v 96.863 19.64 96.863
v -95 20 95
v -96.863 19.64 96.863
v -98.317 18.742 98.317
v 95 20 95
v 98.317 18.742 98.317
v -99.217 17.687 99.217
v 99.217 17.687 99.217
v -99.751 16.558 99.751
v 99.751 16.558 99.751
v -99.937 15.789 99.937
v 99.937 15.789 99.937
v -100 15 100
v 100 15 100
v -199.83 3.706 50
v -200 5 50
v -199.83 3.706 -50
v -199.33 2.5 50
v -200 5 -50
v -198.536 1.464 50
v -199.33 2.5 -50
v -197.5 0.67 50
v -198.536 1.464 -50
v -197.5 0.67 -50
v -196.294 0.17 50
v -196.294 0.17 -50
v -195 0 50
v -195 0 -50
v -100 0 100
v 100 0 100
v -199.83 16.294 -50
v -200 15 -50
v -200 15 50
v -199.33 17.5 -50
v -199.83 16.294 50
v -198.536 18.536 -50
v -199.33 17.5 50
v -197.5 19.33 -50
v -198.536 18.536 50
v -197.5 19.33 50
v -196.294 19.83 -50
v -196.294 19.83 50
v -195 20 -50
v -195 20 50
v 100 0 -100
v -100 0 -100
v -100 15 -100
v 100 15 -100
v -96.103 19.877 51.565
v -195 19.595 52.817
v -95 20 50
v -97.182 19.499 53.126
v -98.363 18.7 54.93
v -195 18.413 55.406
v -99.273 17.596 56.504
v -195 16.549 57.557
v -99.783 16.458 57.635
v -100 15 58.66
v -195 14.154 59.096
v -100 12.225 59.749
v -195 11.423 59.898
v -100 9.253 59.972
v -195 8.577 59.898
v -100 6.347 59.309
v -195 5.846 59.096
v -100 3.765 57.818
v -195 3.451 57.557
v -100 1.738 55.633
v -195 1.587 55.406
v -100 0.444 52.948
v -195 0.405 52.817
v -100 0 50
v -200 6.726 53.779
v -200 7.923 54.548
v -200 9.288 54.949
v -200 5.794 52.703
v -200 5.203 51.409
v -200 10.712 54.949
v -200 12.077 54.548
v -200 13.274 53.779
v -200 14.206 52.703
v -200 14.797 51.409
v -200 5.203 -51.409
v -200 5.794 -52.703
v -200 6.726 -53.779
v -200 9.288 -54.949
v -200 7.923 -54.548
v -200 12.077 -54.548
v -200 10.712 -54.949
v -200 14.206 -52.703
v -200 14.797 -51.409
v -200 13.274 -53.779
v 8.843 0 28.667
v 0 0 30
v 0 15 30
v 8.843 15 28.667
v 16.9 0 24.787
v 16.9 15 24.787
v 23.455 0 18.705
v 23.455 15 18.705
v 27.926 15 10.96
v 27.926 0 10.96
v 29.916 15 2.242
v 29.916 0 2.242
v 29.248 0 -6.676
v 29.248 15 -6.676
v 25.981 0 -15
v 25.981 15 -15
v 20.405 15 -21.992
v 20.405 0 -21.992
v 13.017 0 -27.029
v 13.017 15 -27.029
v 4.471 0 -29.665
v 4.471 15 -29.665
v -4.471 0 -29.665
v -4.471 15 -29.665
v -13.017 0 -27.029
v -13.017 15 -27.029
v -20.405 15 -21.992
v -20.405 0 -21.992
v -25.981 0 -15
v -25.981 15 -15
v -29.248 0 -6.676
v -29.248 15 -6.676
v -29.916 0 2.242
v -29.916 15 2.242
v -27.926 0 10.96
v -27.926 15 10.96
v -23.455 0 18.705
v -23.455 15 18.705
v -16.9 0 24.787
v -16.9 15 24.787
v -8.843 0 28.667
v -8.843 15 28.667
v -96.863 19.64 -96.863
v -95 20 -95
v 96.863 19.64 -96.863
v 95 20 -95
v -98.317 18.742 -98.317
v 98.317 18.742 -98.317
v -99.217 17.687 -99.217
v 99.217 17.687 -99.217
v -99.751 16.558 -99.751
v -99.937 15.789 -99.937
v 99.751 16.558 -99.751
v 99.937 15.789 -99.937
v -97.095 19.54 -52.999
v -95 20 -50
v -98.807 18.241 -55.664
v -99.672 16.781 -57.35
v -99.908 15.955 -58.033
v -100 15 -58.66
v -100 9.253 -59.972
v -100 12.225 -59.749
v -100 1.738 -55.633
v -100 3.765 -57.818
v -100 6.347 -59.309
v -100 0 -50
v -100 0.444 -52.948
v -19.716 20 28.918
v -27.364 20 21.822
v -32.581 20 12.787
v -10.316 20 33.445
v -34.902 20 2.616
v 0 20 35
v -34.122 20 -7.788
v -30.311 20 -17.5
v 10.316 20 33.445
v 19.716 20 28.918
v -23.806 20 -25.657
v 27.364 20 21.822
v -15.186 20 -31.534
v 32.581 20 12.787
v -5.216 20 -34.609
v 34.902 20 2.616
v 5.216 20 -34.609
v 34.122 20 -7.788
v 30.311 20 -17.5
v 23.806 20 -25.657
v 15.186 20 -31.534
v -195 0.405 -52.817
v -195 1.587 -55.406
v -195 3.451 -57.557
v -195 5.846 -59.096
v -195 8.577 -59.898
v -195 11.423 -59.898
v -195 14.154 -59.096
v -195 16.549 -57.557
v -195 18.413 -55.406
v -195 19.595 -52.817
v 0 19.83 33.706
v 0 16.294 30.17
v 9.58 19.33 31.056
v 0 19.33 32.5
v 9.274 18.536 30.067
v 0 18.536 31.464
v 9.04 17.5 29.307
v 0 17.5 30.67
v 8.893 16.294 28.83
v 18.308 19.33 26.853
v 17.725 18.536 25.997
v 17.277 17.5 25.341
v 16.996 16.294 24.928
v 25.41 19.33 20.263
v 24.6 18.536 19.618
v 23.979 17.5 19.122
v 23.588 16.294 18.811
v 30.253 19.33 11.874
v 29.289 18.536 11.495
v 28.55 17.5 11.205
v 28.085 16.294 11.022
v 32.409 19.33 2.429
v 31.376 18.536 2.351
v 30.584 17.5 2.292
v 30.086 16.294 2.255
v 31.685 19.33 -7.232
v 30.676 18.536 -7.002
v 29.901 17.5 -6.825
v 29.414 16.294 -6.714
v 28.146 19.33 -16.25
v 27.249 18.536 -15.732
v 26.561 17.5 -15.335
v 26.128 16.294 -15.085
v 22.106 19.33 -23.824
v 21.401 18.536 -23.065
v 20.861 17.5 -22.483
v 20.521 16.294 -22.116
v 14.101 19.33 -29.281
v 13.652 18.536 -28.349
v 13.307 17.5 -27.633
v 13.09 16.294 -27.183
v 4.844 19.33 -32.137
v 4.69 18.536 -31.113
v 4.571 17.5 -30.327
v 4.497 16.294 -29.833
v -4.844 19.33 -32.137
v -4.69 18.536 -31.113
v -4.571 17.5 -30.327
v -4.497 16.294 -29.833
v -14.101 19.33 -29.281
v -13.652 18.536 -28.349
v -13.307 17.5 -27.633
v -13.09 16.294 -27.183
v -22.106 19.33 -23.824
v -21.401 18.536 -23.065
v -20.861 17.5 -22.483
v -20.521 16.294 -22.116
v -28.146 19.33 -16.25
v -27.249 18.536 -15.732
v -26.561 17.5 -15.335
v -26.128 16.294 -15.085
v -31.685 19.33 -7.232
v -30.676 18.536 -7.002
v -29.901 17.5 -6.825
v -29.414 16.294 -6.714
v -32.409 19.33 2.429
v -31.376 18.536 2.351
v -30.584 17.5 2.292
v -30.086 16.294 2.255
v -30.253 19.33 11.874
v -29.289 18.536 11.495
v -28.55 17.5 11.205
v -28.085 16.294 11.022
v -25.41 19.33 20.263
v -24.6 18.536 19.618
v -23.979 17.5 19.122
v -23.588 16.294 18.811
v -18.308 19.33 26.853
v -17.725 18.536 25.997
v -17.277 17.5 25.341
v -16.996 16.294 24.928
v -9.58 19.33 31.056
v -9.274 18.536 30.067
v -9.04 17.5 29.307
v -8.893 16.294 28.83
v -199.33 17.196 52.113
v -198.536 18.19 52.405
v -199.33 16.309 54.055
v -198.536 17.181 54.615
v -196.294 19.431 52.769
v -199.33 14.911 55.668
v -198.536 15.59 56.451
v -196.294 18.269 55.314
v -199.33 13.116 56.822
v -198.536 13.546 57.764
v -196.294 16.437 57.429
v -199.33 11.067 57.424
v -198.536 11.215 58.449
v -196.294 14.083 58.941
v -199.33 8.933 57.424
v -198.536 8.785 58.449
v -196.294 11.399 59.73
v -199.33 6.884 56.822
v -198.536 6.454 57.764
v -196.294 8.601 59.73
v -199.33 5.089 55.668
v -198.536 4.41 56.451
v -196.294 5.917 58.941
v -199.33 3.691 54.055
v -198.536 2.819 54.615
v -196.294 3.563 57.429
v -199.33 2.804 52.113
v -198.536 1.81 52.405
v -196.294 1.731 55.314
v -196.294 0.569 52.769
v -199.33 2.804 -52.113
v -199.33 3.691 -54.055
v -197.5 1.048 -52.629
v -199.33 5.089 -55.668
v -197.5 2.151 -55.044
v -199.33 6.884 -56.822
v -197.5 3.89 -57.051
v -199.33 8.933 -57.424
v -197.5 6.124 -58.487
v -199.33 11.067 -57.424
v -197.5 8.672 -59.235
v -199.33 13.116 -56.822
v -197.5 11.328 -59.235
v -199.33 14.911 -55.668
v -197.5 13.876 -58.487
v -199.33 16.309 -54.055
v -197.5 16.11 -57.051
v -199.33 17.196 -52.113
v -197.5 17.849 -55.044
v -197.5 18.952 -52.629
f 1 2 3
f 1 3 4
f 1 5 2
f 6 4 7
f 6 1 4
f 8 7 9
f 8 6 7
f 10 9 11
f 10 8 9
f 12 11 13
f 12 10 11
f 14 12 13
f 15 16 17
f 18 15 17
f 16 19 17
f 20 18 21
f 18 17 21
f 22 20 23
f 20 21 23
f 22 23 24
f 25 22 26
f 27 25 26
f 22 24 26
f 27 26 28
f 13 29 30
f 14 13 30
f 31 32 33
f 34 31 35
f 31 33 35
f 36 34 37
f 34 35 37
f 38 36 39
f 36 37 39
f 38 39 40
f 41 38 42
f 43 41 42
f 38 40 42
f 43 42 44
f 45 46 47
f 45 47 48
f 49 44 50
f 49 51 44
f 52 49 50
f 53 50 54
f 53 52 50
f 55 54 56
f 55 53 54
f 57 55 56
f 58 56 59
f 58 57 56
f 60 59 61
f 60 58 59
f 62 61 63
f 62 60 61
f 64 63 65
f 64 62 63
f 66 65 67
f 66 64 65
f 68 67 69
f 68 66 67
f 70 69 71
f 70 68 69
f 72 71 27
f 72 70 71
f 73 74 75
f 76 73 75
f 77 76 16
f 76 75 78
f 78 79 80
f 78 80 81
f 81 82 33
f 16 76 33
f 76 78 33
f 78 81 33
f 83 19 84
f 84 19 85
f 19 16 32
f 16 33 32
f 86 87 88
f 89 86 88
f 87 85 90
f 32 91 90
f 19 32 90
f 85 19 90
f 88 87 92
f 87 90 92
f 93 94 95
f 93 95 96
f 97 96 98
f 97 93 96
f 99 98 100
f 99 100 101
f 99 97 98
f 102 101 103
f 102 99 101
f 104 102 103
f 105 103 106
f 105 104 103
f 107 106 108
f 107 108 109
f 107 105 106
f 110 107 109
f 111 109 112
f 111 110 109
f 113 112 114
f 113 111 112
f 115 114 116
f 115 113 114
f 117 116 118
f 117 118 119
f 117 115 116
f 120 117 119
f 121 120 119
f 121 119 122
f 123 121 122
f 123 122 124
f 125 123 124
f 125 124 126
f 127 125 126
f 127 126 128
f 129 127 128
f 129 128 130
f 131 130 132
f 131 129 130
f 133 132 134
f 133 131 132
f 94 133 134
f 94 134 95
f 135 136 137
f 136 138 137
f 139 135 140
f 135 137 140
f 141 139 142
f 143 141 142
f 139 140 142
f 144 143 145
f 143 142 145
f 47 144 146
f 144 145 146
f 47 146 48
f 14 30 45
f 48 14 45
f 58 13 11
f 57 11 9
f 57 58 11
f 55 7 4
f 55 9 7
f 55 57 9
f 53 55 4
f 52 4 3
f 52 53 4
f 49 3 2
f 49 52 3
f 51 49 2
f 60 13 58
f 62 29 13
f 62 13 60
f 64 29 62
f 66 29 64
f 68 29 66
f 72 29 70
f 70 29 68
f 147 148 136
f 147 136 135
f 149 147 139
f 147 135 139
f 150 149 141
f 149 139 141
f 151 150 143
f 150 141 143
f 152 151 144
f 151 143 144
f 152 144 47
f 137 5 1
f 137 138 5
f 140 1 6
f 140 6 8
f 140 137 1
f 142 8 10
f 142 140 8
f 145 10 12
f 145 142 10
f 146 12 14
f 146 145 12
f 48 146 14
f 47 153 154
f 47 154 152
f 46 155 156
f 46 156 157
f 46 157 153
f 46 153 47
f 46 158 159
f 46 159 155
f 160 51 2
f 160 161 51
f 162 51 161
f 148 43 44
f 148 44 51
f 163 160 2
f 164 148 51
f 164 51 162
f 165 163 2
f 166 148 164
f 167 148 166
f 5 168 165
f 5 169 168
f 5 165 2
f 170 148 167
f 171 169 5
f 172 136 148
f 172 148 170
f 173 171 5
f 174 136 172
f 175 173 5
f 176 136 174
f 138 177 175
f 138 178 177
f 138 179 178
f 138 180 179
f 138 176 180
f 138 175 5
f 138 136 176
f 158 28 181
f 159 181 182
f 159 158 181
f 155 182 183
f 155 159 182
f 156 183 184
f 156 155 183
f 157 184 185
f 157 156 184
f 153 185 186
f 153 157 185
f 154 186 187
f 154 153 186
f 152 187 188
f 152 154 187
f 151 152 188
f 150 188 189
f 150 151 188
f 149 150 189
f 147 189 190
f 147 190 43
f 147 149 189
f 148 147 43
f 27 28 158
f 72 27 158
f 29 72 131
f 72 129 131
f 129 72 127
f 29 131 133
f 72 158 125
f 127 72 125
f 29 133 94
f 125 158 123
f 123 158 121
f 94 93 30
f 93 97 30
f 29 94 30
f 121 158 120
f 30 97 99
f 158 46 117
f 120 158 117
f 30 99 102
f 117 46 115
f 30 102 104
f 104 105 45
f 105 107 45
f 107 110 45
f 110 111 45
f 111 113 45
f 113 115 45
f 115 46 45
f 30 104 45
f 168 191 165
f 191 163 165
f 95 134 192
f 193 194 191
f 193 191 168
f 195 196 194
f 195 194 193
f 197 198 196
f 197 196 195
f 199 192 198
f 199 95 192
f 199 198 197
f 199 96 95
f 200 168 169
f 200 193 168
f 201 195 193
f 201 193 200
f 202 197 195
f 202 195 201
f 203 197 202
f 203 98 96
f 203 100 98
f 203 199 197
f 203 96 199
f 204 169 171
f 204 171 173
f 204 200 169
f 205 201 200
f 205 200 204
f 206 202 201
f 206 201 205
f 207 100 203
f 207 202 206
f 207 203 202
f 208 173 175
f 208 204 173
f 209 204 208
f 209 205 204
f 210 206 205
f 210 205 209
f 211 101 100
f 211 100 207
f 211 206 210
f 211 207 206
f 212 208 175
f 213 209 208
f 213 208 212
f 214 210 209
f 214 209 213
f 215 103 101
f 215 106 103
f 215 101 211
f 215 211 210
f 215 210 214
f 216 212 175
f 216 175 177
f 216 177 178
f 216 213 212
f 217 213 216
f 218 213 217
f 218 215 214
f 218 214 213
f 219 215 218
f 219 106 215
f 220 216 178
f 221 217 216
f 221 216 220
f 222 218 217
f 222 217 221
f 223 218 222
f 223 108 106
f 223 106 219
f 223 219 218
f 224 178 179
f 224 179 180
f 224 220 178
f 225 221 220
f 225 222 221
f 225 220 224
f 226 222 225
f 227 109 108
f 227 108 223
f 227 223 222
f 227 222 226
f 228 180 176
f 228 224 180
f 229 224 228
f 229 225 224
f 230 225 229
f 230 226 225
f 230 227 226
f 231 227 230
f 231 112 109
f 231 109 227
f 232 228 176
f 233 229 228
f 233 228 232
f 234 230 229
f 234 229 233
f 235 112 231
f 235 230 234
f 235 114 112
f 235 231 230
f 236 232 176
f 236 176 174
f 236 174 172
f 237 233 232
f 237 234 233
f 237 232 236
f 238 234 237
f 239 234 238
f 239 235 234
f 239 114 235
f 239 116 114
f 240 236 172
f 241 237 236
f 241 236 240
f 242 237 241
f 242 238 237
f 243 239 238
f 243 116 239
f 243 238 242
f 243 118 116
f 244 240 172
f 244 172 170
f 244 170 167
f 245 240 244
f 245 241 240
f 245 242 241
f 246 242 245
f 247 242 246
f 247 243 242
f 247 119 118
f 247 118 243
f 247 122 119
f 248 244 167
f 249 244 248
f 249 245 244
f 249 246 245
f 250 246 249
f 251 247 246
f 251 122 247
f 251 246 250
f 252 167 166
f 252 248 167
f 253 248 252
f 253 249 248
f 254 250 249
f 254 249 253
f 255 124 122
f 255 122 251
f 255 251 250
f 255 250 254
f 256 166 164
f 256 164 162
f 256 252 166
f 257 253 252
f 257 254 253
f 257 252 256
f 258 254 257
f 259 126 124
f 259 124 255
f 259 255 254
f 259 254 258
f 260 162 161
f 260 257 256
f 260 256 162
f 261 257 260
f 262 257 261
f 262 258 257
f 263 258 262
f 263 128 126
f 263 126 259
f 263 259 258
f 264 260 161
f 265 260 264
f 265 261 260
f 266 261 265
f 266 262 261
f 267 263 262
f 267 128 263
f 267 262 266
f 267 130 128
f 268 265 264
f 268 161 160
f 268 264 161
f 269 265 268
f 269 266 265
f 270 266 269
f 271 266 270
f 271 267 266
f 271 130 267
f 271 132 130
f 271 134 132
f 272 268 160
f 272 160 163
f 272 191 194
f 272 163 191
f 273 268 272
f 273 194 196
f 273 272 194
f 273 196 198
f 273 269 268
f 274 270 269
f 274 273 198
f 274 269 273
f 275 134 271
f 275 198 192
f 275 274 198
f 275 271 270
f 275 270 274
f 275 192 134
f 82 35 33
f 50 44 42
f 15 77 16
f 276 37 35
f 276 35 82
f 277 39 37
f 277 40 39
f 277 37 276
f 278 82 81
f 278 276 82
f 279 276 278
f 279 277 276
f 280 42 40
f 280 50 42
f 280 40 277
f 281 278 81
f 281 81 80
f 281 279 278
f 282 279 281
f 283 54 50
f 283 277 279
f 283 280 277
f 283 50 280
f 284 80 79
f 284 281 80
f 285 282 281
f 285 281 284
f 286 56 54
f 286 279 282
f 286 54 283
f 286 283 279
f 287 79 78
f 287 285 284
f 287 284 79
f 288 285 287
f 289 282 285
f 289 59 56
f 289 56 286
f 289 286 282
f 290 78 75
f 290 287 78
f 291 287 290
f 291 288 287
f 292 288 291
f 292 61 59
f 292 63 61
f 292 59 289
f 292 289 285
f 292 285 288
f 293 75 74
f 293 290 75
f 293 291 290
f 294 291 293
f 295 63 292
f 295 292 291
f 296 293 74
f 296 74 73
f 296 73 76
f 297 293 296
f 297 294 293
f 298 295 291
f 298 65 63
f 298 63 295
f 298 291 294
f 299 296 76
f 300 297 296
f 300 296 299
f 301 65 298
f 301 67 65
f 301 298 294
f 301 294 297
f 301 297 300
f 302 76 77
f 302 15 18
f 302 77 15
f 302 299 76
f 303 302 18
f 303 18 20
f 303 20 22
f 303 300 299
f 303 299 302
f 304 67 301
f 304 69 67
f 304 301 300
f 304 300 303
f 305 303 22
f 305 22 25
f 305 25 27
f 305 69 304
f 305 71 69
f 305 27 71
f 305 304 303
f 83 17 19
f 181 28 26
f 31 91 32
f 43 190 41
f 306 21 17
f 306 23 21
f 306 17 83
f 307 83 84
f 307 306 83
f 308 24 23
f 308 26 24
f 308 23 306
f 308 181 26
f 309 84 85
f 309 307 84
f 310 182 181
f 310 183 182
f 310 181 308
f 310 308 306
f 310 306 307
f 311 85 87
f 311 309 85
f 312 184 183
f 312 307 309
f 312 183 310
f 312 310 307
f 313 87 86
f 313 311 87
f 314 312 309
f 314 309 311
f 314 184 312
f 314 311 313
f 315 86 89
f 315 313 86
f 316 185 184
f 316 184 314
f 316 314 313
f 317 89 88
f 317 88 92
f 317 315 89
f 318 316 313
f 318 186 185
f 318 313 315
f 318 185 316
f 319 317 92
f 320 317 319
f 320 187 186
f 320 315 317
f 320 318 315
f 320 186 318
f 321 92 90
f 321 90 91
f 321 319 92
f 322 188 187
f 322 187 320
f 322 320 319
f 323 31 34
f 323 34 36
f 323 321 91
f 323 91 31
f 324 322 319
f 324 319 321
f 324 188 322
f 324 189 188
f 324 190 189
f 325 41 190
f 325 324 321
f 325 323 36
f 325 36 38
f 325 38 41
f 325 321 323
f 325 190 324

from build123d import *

# Parameters (mm, degrees)
SKETCH2_W           = 200
SKETCH2_H           = 200
SKETCH2_R           = 30
BOSS_EXTRUDE2_DEPTH = 20
BOSS_EXTRUDE3_DEPTH = 100
FILLET1_R           = 5


with BuildPart() as part:
    # Sketch2 → Boss-Extrude2 (new body)
    with BuildSketch(Plane(origin=(0, 0, 0), x_dir=(1, 0, 0), z_dir=(0, 1, 0))):
        Rectangle(SKETCH2_W, SKETCH2_H)
        with Locations(Location((0, 0, 0), (0, 0, 270))):
            Circle(SKETCH2_R, mode=Mode.SUBTRACT)
    extrude(amount=BOSS_EXTRUDE2_DEPTH)

    # Sketch4 → Boss-Extrude3 (add)
    with BuildSketch(Plane.ZY.offset(100)):
        with BuildLine():
            Line((-50, 20), (50, 20))
            ThreePointArc((50, 20), (60, 10), (50, 0))
            Line((50, 0), (-50, 0))
            ThreePointArc((-50, 0), (-60, 10), (-50, 20))
        make_face()
    extrude(amount=BOSS_EXTRUDE3_DEPTH)

    # Fillet1
    fillet1_edges = [part.edges().sort_by_distance(p)[0] for p in [
        (0, 20, -30),
        (-100, 20, -75),
        (0, 20, 100),
        (-100, 20, 75),
        (-200, 10, -60),
        (-200, 0, 0),
        (-200, 10, 60),
        (-200, 20, 0),
        (100, 20, 0),
        (0, 20, -100),
    ]]
    fillet(fillet1_edges, radius=FILLET1_R)


solid = part.part
